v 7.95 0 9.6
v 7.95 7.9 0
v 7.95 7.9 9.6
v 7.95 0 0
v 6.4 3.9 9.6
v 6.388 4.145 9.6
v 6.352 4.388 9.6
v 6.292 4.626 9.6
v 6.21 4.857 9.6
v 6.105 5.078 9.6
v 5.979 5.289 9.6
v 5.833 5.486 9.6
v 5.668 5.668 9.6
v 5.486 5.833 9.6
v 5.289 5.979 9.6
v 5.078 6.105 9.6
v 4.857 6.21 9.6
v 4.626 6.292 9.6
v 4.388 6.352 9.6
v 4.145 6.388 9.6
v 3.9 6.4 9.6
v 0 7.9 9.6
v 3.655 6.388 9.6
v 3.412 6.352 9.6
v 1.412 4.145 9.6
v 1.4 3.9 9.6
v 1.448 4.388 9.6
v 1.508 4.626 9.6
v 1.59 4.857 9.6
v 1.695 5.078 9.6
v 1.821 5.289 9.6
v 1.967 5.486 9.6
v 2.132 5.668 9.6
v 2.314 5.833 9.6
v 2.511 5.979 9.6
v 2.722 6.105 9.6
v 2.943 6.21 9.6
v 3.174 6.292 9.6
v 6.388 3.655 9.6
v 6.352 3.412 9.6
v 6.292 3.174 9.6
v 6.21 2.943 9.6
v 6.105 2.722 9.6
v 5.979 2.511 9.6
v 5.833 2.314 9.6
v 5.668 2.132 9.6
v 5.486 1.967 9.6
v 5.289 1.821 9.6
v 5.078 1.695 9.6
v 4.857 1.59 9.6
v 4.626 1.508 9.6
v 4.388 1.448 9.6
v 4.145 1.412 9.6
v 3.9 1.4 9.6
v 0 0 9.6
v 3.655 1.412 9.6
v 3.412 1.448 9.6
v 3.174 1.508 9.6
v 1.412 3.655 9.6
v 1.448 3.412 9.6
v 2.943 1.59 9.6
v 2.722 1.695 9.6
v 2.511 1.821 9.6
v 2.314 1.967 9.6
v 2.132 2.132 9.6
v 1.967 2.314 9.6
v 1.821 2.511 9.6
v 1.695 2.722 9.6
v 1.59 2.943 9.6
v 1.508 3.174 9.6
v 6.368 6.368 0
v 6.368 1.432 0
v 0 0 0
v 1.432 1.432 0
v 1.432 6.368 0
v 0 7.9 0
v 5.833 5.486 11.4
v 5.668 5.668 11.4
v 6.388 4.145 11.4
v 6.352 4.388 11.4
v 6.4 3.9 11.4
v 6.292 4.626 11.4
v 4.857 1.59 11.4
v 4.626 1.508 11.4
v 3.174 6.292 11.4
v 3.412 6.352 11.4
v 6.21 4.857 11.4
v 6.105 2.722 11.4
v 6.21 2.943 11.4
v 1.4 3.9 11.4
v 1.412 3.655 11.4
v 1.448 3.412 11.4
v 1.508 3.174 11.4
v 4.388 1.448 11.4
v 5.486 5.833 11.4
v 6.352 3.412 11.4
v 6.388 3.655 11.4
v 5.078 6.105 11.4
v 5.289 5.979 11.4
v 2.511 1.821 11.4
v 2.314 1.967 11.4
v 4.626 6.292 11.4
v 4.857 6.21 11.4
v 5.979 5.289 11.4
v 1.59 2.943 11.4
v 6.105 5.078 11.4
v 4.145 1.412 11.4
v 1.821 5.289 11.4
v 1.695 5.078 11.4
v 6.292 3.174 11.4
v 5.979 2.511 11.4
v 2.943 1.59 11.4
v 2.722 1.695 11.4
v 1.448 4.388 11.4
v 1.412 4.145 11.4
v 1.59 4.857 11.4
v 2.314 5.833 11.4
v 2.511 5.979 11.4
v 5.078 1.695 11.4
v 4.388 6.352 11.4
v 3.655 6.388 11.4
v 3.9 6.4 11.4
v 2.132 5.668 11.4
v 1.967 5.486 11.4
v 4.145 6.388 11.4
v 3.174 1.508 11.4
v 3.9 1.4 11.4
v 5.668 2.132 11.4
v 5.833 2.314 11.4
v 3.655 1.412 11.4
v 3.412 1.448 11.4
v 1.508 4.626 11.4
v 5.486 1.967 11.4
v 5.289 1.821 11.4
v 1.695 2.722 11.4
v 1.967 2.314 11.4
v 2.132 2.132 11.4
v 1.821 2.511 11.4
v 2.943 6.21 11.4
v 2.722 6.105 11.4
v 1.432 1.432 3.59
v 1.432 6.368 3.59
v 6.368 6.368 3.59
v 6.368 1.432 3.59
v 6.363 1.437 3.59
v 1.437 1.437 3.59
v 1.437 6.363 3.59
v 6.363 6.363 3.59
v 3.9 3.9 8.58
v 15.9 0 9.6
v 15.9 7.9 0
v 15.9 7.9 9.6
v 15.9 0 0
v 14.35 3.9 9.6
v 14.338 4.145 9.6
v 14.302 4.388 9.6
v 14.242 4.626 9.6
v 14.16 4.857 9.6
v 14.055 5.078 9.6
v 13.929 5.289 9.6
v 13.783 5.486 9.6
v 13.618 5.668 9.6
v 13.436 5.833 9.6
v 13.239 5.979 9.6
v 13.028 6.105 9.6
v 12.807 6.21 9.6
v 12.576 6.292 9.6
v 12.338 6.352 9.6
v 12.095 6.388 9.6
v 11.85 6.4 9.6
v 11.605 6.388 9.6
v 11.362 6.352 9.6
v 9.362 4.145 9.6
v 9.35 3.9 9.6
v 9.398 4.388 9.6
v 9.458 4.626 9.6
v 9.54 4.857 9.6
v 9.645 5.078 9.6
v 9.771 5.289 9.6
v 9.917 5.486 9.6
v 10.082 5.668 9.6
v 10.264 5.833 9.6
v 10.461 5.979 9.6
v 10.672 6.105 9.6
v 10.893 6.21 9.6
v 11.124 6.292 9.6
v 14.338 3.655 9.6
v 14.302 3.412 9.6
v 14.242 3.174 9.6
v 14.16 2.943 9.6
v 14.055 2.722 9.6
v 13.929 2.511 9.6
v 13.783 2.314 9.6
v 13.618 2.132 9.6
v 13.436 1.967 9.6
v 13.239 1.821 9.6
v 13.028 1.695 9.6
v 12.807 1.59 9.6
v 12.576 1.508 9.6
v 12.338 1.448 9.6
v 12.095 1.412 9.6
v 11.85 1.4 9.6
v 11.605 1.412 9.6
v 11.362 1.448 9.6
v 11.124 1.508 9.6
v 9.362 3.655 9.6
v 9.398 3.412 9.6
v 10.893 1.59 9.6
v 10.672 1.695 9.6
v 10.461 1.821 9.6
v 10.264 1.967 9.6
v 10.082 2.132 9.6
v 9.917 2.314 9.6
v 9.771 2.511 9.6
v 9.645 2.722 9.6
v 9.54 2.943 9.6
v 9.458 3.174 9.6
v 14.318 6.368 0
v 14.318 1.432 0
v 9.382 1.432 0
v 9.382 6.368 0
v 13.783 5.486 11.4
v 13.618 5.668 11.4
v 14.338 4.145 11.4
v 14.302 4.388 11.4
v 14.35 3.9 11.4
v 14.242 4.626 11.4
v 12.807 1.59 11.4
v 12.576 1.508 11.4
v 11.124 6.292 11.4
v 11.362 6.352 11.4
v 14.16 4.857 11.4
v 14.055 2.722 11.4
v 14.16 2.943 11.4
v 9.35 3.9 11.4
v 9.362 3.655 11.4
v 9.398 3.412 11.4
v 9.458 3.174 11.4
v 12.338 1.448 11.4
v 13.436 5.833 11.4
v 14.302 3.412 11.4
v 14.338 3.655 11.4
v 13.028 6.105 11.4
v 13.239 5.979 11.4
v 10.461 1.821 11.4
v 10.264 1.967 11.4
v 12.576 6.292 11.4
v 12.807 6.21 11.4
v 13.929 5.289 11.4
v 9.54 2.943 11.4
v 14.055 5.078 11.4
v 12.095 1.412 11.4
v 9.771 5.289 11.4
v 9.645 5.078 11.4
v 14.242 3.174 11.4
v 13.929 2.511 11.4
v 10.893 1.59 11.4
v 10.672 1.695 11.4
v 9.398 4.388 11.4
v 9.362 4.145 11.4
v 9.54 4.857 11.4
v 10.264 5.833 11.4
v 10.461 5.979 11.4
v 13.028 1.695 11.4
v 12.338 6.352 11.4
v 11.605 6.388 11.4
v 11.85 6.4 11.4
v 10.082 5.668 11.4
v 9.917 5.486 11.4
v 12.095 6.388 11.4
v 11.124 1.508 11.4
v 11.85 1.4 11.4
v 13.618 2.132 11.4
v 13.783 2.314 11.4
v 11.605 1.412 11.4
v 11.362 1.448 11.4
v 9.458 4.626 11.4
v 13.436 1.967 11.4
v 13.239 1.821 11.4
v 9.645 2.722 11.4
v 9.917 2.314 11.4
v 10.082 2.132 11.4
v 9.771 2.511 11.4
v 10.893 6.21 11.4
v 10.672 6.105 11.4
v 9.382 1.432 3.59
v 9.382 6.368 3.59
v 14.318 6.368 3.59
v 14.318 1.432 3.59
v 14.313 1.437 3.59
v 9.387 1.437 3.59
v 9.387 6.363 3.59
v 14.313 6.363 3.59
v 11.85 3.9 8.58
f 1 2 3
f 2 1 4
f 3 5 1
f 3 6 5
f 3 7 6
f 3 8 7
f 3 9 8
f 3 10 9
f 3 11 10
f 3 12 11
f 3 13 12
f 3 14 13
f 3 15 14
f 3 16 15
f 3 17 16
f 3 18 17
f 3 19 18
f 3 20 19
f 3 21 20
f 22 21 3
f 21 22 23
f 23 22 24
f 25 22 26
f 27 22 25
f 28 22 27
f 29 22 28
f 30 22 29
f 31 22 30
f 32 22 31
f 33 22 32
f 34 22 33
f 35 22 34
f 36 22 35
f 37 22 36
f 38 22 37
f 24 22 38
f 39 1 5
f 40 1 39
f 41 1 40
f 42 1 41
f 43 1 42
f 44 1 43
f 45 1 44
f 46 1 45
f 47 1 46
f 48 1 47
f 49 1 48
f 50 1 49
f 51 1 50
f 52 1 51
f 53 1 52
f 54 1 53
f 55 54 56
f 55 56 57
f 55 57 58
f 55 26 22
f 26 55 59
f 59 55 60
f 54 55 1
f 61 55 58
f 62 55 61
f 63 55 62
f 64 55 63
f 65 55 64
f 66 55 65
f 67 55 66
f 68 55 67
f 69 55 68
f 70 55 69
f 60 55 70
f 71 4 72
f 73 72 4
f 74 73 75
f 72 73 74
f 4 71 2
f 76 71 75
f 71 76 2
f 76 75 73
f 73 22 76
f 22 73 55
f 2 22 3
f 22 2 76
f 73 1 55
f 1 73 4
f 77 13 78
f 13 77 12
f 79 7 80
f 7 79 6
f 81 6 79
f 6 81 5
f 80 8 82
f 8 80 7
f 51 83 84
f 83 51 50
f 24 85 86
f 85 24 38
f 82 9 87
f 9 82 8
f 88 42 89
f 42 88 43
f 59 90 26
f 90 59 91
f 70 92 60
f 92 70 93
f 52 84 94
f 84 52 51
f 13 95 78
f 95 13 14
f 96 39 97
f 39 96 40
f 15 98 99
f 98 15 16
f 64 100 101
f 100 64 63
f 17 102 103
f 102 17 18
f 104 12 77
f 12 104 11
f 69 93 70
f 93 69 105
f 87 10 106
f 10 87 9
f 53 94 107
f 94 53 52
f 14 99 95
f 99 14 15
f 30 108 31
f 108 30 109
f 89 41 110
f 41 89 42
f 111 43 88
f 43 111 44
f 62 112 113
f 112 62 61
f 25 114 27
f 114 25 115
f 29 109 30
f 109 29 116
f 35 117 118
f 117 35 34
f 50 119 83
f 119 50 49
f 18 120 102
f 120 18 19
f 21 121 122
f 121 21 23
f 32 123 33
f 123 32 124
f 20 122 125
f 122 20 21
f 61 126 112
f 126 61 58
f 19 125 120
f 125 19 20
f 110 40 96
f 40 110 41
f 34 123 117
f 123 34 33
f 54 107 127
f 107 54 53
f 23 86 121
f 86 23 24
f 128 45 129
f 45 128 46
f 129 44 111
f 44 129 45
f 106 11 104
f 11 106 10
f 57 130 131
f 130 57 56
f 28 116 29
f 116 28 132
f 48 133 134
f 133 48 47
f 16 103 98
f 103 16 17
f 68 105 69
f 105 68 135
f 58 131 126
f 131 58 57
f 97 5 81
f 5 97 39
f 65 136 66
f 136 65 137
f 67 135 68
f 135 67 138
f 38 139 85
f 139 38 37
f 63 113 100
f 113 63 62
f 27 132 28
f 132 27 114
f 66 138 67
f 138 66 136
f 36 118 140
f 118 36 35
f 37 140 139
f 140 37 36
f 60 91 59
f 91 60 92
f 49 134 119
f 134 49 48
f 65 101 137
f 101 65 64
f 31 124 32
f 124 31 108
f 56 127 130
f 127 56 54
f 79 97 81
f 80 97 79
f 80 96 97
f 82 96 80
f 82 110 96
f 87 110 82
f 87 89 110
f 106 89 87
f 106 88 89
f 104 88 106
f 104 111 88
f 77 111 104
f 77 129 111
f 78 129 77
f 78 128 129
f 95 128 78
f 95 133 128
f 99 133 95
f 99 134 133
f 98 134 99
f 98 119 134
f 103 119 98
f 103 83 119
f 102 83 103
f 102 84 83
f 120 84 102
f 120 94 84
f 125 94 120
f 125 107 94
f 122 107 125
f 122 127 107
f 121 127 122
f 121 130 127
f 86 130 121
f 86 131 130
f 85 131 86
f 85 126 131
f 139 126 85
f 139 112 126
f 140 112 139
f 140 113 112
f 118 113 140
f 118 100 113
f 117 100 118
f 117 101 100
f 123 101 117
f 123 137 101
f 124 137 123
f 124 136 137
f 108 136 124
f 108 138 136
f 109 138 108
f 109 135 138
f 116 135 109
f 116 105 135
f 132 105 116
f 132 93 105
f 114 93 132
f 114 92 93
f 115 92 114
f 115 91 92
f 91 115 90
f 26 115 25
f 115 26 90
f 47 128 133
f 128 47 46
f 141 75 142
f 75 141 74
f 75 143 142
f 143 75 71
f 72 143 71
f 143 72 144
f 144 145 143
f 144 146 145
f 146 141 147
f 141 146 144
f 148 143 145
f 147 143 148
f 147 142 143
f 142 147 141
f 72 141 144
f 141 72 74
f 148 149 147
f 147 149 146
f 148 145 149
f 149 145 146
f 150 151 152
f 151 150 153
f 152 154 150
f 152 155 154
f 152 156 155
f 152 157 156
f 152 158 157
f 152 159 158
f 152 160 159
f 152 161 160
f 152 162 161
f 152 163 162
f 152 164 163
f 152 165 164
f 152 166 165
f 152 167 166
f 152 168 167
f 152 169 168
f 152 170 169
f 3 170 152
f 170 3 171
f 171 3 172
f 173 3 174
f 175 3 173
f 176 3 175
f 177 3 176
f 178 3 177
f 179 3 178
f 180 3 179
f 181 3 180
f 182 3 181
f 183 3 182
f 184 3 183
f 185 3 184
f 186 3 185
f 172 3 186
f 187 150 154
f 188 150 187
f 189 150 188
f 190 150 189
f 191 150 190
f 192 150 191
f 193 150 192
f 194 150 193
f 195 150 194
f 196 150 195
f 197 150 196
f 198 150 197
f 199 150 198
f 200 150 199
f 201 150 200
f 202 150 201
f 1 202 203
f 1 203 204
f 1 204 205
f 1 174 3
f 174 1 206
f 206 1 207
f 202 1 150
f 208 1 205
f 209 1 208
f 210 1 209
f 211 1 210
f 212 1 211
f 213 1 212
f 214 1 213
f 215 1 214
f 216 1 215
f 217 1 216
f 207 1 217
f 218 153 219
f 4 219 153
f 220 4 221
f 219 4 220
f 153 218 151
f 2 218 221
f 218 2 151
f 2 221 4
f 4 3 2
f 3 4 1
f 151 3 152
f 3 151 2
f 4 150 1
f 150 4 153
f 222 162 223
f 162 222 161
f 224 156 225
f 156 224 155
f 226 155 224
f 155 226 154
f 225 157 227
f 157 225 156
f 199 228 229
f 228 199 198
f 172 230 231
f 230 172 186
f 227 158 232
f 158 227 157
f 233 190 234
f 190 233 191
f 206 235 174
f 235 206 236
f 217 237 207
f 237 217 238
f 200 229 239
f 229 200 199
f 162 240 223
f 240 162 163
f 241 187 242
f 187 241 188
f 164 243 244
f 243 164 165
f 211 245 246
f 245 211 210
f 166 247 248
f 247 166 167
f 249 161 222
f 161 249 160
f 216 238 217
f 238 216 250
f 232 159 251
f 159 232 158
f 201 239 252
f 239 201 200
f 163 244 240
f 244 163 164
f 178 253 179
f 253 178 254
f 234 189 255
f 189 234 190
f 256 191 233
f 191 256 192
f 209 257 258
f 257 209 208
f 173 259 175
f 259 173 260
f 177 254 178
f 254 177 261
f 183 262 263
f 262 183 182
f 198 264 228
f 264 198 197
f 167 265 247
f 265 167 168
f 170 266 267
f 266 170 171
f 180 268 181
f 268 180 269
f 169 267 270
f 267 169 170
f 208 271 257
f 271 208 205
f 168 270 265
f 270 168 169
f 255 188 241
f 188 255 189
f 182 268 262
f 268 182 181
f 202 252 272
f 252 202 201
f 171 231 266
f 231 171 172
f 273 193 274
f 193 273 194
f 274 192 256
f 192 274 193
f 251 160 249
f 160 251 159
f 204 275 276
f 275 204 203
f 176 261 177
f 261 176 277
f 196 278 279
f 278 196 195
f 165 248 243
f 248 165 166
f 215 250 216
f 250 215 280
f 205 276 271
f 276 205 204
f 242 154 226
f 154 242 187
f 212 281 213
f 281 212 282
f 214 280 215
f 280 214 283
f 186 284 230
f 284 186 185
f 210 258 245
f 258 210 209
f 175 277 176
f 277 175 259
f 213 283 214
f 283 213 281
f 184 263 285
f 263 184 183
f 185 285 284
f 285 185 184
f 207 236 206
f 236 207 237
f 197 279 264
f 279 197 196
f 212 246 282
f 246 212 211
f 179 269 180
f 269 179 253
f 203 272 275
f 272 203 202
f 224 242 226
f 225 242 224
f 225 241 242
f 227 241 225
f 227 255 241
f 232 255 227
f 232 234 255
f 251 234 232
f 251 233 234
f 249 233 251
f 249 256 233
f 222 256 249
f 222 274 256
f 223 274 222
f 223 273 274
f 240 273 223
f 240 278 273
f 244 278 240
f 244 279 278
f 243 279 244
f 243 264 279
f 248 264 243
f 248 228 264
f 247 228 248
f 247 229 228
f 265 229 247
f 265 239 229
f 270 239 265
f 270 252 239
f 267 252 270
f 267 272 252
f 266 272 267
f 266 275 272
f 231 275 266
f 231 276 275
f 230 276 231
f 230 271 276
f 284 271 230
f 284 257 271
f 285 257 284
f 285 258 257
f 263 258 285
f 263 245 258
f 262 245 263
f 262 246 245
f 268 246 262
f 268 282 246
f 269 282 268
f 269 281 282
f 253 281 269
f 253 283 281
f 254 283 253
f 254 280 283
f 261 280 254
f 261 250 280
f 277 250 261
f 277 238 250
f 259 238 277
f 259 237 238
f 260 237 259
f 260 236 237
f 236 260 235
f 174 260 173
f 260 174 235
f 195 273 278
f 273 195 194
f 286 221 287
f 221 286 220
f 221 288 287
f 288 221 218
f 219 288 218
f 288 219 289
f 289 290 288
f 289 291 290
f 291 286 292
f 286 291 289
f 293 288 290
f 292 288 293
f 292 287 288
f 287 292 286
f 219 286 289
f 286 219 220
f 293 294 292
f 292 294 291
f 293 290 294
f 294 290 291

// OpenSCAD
// Global Options
$fn = 64;

// Options
x = 2;
y = 1;
pegTolerance = -0.1;
holeTolerance = 0.1;

// Calculations
halfPegTolerance = pegTolerance / 2;
halfHoleTolerance = holeTolerance / 2;

// Brick
union()
{
    for (xi = [0: x - 1])
    {
        for (yi = [0: y - 1])
        {
            translate([7.95 * xi, 7.9 * yi, 0])
            {
                difference()
                {                    
                    union()
                    {
                        cube([7.95, 7.9, 9.6]);
                        translate([3.9, 3.9, 9.6])
                        {
                           cylinder(1.8, 2.4 - pegTolerance, 2.4 - pegTolerance, center=false);
                        }                    
                    }
                    union()
                    {
                        translate([3.9, 3.9, -0.01])
                        {
                            rotate(a=45, v=[0,0,1])
                            {
                                cylinder(1.8 * 2, 3.39 + holeTolerance, 3.39 + holeTolerance, center=false, $fn=4);
                            }
                        }
                        translate([3.9, 3.9, (1.8 * 2) - 0.02])
                        {      
                            rotate(a=45, v=[0,0,1])
                            {
                                cylinder(5, 3.39 + holeTolerance, 0, center=false, $fn=4);
                            }
                        }
                    }
                }
            }
        }
    }
}
